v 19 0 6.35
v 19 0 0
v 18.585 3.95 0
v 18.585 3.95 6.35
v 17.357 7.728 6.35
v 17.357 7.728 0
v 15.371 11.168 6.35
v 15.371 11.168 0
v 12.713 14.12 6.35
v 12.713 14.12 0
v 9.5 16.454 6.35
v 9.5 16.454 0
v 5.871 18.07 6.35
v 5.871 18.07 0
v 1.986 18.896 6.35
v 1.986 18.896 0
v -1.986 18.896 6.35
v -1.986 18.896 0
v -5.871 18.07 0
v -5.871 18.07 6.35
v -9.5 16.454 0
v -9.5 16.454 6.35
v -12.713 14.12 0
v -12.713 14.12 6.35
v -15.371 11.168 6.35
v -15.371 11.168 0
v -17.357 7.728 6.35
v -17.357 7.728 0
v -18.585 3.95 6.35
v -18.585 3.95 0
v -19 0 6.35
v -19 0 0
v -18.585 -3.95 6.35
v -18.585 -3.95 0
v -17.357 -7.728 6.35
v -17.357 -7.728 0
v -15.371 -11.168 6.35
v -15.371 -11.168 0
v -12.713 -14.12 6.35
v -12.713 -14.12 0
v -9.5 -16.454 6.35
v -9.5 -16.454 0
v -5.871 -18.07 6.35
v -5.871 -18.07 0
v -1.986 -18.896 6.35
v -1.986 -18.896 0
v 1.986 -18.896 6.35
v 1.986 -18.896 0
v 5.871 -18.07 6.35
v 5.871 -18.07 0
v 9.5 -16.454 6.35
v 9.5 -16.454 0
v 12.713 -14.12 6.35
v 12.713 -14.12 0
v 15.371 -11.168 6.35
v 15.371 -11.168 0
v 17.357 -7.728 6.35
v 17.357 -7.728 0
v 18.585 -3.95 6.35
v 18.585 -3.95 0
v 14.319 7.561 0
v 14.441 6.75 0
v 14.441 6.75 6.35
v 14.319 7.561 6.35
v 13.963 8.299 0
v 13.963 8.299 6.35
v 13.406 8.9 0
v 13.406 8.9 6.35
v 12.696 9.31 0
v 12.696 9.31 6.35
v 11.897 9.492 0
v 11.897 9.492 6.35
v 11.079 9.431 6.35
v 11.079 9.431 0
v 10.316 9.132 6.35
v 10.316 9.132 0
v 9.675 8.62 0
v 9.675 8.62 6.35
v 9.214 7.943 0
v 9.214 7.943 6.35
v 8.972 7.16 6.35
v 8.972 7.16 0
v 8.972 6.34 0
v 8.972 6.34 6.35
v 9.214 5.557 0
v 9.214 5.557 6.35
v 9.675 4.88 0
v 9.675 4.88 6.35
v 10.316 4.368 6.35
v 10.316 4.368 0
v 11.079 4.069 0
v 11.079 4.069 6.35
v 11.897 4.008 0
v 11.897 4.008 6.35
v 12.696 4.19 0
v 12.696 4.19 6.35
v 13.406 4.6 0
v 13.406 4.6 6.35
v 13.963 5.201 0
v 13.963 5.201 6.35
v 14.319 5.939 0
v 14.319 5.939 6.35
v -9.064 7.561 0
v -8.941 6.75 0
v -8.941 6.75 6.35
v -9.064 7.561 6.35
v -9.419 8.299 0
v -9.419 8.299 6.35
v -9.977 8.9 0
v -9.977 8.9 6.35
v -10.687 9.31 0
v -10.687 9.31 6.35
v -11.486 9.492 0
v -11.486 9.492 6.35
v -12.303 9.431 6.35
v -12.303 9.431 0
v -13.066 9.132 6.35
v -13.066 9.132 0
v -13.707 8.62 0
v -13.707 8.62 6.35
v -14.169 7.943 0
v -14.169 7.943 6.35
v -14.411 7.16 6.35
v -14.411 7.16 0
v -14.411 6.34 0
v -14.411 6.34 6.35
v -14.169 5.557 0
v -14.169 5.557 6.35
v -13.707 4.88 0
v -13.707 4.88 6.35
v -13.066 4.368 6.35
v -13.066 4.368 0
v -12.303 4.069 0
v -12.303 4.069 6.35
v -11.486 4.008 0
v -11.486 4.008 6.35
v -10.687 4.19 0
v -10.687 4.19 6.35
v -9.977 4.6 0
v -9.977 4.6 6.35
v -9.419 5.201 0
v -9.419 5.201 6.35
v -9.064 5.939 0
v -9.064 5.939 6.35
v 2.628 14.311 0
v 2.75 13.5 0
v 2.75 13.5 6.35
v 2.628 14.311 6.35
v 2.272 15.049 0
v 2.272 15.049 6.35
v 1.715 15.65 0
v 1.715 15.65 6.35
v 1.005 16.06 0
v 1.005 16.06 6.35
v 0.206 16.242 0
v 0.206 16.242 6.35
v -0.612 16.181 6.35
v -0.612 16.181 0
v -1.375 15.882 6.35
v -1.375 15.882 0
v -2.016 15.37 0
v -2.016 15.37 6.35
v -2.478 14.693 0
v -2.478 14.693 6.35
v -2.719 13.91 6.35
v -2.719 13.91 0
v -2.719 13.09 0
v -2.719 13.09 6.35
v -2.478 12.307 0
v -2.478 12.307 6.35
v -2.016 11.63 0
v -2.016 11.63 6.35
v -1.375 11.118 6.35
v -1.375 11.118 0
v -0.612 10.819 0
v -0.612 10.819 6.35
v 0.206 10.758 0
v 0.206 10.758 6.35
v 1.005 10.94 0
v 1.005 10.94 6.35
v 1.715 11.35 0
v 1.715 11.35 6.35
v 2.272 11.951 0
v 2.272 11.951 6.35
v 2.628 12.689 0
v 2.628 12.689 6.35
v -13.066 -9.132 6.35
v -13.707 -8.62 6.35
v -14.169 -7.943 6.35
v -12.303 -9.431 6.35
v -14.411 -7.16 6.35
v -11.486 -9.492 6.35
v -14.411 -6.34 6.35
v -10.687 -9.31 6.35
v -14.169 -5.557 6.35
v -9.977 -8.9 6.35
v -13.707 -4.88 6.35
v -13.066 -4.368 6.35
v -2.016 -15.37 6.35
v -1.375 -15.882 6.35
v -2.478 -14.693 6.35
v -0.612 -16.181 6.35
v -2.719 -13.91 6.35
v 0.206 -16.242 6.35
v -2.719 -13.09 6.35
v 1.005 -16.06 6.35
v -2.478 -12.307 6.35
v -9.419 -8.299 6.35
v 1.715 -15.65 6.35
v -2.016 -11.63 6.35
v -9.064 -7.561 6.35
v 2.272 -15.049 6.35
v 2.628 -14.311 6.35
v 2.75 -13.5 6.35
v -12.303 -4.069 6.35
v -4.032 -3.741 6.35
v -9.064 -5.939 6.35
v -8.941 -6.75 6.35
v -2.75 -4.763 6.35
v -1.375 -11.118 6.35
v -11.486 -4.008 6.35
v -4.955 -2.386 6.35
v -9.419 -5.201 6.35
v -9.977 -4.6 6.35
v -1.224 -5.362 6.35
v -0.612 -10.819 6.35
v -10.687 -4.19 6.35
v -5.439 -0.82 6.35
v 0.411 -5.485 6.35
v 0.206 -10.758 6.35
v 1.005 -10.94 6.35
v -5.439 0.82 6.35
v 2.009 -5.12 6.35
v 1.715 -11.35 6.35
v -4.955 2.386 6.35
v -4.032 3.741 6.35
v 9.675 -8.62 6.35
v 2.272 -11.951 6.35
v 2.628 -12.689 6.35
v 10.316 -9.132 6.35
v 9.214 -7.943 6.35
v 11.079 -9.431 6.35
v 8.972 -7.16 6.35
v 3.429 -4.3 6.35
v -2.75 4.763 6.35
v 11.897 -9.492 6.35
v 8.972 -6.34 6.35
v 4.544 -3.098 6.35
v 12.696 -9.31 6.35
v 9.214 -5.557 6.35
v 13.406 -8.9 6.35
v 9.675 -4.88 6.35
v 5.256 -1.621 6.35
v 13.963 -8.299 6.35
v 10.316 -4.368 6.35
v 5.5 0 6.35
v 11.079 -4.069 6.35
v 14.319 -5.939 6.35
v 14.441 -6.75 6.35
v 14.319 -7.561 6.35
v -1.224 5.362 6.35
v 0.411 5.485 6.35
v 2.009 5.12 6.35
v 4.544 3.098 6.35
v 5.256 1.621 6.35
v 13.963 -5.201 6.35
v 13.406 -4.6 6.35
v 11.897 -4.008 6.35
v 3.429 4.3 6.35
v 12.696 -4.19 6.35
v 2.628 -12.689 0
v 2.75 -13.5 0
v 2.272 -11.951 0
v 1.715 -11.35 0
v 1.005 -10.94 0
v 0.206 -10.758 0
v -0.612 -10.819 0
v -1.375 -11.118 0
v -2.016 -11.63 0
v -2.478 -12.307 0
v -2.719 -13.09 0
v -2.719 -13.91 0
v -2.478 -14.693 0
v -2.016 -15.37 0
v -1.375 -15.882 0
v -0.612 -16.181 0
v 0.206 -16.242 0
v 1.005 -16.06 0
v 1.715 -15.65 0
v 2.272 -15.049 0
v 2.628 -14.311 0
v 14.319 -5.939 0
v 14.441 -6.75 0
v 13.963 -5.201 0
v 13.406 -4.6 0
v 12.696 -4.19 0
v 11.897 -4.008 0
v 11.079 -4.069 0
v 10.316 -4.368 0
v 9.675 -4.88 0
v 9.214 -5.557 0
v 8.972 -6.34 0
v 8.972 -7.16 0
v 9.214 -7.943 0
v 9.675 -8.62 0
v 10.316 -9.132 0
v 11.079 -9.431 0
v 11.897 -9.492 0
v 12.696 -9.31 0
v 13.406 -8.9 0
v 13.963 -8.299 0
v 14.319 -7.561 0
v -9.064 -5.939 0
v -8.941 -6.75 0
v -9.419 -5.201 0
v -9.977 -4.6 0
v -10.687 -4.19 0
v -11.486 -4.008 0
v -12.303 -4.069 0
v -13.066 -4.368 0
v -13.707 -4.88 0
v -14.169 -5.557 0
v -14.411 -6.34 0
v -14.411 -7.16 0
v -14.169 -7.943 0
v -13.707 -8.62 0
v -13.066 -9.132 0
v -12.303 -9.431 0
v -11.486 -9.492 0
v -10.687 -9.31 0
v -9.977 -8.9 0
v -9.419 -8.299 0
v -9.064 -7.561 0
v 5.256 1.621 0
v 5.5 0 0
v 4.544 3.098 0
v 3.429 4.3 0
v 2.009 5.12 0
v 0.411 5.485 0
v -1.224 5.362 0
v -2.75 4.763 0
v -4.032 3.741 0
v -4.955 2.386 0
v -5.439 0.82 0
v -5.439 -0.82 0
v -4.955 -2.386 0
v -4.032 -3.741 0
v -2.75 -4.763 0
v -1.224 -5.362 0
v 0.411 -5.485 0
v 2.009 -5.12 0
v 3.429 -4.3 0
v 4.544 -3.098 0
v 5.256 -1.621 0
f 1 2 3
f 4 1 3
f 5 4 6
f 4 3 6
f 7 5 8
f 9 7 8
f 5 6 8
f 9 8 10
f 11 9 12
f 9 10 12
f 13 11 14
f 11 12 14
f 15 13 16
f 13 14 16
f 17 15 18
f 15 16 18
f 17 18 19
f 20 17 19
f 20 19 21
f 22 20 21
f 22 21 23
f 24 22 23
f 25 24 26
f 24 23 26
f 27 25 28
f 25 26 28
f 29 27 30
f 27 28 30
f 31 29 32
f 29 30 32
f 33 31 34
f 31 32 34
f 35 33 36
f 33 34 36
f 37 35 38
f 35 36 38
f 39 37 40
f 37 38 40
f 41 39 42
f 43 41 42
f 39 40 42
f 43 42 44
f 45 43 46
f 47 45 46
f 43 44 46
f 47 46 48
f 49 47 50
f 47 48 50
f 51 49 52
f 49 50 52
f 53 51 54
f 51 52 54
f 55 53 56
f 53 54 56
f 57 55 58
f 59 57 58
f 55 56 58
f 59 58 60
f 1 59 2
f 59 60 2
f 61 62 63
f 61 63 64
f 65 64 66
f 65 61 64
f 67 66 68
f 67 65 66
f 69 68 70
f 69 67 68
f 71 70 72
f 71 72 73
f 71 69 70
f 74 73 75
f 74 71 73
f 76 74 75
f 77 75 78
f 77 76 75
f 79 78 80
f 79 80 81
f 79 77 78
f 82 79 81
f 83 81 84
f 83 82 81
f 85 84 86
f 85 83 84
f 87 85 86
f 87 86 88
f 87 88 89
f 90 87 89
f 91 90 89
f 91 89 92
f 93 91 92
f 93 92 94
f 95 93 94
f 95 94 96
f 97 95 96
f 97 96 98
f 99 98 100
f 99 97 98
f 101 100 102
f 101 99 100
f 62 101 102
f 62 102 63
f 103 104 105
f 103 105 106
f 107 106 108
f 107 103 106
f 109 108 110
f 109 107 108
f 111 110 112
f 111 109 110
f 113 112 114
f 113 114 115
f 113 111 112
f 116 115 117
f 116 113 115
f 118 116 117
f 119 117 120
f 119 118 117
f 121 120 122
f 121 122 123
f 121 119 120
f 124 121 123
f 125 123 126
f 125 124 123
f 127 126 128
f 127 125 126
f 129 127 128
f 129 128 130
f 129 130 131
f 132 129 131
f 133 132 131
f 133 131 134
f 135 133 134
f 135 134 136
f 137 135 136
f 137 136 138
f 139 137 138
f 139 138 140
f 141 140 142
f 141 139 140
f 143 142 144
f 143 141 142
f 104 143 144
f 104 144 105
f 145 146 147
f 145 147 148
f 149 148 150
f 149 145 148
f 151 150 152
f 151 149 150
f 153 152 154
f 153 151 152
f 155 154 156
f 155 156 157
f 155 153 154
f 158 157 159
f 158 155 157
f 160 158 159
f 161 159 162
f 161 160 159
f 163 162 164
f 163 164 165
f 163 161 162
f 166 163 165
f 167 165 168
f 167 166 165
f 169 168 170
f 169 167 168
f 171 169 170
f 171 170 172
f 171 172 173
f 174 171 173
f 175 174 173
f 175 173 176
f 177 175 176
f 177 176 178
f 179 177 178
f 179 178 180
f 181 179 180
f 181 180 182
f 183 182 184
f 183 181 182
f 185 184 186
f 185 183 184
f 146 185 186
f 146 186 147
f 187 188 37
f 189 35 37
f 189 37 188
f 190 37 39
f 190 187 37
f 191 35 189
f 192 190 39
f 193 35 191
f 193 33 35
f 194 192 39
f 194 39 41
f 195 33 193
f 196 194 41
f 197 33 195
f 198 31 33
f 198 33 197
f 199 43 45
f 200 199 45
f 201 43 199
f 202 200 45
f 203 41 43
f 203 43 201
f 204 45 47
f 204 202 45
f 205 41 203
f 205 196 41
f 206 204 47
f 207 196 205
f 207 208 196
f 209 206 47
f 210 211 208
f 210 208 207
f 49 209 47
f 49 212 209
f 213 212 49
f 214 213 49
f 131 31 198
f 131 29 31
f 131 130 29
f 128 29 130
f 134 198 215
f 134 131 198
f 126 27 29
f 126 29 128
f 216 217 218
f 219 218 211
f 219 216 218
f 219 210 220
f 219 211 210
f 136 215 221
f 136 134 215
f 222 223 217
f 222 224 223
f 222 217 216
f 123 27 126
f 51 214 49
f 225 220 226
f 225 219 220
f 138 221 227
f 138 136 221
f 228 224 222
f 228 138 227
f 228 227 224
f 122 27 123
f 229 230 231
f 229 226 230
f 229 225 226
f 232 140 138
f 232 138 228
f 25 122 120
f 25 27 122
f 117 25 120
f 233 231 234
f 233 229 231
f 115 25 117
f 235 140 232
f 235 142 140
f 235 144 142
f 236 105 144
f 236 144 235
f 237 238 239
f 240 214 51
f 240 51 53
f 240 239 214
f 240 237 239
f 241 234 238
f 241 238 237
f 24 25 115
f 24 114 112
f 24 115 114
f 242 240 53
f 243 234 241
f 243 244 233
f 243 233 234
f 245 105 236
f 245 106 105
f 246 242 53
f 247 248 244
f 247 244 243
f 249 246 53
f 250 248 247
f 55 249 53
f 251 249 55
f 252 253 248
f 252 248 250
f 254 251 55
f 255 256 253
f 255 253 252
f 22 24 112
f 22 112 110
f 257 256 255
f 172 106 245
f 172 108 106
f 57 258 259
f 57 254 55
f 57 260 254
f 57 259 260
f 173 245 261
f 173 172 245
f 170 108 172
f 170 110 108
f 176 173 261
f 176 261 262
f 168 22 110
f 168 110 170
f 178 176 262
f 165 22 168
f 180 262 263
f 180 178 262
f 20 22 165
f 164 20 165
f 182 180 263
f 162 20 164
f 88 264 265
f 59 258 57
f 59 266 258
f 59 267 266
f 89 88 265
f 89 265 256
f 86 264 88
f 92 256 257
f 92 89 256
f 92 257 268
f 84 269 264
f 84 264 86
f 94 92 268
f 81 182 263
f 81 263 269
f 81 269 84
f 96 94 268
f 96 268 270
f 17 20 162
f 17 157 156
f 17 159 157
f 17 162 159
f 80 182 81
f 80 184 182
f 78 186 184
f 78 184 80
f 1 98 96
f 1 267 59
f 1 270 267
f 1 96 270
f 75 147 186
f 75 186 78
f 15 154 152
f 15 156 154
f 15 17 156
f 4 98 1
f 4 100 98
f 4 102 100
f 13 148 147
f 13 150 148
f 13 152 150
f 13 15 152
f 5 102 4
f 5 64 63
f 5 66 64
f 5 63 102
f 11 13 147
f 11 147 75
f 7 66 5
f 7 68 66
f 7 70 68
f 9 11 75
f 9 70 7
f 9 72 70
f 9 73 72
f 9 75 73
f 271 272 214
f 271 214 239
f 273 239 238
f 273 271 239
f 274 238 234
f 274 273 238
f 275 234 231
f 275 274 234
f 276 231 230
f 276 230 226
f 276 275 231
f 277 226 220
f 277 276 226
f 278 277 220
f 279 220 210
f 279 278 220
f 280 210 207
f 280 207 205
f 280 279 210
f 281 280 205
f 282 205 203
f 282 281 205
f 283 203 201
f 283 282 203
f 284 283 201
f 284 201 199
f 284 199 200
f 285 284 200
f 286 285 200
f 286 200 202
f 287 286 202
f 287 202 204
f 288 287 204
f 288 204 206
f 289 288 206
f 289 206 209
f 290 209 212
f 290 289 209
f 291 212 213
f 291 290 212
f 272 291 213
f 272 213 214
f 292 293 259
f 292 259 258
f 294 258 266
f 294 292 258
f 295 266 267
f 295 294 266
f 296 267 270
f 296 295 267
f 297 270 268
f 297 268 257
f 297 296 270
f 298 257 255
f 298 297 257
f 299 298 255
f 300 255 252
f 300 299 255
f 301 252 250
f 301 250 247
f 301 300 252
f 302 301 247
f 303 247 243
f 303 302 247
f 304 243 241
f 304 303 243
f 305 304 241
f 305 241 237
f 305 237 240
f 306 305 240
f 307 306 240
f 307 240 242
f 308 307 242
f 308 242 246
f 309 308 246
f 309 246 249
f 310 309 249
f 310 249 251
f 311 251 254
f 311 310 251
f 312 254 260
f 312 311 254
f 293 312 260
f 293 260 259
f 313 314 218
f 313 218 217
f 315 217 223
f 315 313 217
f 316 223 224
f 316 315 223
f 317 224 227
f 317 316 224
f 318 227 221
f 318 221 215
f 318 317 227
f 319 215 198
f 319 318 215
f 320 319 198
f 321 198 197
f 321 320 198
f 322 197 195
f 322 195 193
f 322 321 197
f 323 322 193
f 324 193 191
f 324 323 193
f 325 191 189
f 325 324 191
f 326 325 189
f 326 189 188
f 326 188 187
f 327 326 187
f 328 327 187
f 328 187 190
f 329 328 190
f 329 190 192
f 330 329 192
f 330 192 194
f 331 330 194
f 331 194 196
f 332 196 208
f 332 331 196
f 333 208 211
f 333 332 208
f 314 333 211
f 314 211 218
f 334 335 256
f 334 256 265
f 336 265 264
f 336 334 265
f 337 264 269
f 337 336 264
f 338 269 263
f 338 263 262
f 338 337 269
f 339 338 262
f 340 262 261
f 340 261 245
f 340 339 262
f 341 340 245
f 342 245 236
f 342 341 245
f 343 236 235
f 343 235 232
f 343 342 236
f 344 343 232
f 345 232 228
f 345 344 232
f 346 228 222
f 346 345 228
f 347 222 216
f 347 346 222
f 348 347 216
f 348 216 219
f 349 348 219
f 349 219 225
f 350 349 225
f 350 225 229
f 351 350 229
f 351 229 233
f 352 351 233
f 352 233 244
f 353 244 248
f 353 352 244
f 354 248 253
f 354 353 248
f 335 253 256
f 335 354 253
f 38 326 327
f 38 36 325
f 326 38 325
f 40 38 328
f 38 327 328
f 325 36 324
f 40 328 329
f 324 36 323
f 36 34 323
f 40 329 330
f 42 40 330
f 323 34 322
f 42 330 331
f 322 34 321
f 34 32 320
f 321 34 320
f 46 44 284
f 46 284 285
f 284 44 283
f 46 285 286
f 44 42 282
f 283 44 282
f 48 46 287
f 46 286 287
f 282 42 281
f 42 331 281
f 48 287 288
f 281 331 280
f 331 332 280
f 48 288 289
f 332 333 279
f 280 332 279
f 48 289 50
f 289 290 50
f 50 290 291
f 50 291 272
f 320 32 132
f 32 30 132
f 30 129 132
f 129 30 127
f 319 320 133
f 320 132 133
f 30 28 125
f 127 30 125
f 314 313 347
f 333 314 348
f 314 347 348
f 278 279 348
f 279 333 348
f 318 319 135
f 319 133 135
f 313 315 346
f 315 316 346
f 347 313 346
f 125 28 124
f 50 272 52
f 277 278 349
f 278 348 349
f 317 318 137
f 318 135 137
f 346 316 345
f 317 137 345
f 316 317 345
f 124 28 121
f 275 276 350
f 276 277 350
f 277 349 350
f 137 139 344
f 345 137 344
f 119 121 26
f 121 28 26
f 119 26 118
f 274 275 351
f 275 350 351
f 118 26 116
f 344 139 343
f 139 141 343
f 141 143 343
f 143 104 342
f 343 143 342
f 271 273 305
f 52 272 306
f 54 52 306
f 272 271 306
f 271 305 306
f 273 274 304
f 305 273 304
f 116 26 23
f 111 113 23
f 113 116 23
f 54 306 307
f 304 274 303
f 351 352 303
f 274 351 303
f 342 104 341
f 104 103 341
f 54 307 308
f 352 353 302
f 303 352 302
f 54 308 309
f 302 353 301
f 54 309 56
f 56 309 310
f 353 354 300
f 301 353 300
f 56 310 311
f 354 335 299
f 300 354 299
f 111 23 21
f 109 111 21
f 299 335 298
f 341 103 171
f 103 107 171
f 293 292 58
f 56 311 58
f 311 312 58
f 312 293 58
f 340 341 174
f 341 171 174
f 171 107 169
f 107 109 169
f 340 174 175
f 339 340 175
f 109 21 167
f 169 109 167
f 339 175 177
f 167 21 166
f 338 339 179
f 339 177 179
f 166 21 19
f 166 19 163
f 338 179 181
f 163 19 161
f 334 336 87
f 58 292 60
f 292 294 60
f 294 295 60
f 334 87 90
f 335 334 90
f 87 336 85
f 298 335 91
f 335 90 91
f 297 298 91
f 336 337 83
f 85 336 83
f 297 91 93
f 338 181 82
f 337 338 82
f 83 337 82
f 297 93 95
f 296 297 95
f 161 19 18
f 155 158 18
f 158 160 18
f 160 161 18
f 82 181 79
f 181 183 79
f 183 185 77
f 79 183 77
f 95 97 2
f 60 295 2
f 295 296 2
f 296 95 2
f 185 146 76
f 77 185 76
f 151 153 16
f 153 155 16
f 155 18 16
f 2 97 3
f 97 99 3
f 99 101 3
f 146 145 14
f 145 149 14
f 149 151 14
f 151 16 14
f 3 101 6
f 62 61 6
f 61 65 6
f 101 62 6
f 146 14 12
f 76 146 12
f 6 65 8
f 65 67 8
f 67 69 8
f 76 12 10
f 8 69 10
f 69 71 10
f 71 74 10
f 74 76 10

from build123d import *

# Parameters (mm, degrees)
SKETCH1_R         = 19
SKETCH1_R_2       = 5.5
EXTRUDE_1_4_DEPTH = 6.35
SKETCH2_R         = 2.75
M5_THROUGH_DEPTH  = 6.35


with BuildPart() as part:
    # Sketch1 → 1/4 (new body)
    with BuildSketch(Plane.XY):
        Circle(SKETCH1_R)
        Circle(SKETCH1_R_2, mode=Mode.SUBTRACT)
    extrude(amount=EXTRUDE_1_4_DEPTH)

    # Sketch2 → M5_through (cut)
    with BuildSketch(Plane.XY):
        with Locations((0, 13.5)):
            Circle(SKETCH2_R)
        with Locations((11.691342951, 6.75)):
            Circle(SKETCH2_R)
        with Locations((11.691342951, -6.75)):
            Circle(SKETCH2_R)
        with Locations((0, -13.5)):
            Circle(SKETCH2_R)
        with Locations((-11.691342951, -6.75)):
            Circle(SKETCH2_R)
        with Locations((-11.691342951, 6.75)):
            Circle(SKETCH2_R)
    extrude(amount=M5_THROUGH_DEPTH, mode=Mode.SUBTRACT)


solid = part.part
